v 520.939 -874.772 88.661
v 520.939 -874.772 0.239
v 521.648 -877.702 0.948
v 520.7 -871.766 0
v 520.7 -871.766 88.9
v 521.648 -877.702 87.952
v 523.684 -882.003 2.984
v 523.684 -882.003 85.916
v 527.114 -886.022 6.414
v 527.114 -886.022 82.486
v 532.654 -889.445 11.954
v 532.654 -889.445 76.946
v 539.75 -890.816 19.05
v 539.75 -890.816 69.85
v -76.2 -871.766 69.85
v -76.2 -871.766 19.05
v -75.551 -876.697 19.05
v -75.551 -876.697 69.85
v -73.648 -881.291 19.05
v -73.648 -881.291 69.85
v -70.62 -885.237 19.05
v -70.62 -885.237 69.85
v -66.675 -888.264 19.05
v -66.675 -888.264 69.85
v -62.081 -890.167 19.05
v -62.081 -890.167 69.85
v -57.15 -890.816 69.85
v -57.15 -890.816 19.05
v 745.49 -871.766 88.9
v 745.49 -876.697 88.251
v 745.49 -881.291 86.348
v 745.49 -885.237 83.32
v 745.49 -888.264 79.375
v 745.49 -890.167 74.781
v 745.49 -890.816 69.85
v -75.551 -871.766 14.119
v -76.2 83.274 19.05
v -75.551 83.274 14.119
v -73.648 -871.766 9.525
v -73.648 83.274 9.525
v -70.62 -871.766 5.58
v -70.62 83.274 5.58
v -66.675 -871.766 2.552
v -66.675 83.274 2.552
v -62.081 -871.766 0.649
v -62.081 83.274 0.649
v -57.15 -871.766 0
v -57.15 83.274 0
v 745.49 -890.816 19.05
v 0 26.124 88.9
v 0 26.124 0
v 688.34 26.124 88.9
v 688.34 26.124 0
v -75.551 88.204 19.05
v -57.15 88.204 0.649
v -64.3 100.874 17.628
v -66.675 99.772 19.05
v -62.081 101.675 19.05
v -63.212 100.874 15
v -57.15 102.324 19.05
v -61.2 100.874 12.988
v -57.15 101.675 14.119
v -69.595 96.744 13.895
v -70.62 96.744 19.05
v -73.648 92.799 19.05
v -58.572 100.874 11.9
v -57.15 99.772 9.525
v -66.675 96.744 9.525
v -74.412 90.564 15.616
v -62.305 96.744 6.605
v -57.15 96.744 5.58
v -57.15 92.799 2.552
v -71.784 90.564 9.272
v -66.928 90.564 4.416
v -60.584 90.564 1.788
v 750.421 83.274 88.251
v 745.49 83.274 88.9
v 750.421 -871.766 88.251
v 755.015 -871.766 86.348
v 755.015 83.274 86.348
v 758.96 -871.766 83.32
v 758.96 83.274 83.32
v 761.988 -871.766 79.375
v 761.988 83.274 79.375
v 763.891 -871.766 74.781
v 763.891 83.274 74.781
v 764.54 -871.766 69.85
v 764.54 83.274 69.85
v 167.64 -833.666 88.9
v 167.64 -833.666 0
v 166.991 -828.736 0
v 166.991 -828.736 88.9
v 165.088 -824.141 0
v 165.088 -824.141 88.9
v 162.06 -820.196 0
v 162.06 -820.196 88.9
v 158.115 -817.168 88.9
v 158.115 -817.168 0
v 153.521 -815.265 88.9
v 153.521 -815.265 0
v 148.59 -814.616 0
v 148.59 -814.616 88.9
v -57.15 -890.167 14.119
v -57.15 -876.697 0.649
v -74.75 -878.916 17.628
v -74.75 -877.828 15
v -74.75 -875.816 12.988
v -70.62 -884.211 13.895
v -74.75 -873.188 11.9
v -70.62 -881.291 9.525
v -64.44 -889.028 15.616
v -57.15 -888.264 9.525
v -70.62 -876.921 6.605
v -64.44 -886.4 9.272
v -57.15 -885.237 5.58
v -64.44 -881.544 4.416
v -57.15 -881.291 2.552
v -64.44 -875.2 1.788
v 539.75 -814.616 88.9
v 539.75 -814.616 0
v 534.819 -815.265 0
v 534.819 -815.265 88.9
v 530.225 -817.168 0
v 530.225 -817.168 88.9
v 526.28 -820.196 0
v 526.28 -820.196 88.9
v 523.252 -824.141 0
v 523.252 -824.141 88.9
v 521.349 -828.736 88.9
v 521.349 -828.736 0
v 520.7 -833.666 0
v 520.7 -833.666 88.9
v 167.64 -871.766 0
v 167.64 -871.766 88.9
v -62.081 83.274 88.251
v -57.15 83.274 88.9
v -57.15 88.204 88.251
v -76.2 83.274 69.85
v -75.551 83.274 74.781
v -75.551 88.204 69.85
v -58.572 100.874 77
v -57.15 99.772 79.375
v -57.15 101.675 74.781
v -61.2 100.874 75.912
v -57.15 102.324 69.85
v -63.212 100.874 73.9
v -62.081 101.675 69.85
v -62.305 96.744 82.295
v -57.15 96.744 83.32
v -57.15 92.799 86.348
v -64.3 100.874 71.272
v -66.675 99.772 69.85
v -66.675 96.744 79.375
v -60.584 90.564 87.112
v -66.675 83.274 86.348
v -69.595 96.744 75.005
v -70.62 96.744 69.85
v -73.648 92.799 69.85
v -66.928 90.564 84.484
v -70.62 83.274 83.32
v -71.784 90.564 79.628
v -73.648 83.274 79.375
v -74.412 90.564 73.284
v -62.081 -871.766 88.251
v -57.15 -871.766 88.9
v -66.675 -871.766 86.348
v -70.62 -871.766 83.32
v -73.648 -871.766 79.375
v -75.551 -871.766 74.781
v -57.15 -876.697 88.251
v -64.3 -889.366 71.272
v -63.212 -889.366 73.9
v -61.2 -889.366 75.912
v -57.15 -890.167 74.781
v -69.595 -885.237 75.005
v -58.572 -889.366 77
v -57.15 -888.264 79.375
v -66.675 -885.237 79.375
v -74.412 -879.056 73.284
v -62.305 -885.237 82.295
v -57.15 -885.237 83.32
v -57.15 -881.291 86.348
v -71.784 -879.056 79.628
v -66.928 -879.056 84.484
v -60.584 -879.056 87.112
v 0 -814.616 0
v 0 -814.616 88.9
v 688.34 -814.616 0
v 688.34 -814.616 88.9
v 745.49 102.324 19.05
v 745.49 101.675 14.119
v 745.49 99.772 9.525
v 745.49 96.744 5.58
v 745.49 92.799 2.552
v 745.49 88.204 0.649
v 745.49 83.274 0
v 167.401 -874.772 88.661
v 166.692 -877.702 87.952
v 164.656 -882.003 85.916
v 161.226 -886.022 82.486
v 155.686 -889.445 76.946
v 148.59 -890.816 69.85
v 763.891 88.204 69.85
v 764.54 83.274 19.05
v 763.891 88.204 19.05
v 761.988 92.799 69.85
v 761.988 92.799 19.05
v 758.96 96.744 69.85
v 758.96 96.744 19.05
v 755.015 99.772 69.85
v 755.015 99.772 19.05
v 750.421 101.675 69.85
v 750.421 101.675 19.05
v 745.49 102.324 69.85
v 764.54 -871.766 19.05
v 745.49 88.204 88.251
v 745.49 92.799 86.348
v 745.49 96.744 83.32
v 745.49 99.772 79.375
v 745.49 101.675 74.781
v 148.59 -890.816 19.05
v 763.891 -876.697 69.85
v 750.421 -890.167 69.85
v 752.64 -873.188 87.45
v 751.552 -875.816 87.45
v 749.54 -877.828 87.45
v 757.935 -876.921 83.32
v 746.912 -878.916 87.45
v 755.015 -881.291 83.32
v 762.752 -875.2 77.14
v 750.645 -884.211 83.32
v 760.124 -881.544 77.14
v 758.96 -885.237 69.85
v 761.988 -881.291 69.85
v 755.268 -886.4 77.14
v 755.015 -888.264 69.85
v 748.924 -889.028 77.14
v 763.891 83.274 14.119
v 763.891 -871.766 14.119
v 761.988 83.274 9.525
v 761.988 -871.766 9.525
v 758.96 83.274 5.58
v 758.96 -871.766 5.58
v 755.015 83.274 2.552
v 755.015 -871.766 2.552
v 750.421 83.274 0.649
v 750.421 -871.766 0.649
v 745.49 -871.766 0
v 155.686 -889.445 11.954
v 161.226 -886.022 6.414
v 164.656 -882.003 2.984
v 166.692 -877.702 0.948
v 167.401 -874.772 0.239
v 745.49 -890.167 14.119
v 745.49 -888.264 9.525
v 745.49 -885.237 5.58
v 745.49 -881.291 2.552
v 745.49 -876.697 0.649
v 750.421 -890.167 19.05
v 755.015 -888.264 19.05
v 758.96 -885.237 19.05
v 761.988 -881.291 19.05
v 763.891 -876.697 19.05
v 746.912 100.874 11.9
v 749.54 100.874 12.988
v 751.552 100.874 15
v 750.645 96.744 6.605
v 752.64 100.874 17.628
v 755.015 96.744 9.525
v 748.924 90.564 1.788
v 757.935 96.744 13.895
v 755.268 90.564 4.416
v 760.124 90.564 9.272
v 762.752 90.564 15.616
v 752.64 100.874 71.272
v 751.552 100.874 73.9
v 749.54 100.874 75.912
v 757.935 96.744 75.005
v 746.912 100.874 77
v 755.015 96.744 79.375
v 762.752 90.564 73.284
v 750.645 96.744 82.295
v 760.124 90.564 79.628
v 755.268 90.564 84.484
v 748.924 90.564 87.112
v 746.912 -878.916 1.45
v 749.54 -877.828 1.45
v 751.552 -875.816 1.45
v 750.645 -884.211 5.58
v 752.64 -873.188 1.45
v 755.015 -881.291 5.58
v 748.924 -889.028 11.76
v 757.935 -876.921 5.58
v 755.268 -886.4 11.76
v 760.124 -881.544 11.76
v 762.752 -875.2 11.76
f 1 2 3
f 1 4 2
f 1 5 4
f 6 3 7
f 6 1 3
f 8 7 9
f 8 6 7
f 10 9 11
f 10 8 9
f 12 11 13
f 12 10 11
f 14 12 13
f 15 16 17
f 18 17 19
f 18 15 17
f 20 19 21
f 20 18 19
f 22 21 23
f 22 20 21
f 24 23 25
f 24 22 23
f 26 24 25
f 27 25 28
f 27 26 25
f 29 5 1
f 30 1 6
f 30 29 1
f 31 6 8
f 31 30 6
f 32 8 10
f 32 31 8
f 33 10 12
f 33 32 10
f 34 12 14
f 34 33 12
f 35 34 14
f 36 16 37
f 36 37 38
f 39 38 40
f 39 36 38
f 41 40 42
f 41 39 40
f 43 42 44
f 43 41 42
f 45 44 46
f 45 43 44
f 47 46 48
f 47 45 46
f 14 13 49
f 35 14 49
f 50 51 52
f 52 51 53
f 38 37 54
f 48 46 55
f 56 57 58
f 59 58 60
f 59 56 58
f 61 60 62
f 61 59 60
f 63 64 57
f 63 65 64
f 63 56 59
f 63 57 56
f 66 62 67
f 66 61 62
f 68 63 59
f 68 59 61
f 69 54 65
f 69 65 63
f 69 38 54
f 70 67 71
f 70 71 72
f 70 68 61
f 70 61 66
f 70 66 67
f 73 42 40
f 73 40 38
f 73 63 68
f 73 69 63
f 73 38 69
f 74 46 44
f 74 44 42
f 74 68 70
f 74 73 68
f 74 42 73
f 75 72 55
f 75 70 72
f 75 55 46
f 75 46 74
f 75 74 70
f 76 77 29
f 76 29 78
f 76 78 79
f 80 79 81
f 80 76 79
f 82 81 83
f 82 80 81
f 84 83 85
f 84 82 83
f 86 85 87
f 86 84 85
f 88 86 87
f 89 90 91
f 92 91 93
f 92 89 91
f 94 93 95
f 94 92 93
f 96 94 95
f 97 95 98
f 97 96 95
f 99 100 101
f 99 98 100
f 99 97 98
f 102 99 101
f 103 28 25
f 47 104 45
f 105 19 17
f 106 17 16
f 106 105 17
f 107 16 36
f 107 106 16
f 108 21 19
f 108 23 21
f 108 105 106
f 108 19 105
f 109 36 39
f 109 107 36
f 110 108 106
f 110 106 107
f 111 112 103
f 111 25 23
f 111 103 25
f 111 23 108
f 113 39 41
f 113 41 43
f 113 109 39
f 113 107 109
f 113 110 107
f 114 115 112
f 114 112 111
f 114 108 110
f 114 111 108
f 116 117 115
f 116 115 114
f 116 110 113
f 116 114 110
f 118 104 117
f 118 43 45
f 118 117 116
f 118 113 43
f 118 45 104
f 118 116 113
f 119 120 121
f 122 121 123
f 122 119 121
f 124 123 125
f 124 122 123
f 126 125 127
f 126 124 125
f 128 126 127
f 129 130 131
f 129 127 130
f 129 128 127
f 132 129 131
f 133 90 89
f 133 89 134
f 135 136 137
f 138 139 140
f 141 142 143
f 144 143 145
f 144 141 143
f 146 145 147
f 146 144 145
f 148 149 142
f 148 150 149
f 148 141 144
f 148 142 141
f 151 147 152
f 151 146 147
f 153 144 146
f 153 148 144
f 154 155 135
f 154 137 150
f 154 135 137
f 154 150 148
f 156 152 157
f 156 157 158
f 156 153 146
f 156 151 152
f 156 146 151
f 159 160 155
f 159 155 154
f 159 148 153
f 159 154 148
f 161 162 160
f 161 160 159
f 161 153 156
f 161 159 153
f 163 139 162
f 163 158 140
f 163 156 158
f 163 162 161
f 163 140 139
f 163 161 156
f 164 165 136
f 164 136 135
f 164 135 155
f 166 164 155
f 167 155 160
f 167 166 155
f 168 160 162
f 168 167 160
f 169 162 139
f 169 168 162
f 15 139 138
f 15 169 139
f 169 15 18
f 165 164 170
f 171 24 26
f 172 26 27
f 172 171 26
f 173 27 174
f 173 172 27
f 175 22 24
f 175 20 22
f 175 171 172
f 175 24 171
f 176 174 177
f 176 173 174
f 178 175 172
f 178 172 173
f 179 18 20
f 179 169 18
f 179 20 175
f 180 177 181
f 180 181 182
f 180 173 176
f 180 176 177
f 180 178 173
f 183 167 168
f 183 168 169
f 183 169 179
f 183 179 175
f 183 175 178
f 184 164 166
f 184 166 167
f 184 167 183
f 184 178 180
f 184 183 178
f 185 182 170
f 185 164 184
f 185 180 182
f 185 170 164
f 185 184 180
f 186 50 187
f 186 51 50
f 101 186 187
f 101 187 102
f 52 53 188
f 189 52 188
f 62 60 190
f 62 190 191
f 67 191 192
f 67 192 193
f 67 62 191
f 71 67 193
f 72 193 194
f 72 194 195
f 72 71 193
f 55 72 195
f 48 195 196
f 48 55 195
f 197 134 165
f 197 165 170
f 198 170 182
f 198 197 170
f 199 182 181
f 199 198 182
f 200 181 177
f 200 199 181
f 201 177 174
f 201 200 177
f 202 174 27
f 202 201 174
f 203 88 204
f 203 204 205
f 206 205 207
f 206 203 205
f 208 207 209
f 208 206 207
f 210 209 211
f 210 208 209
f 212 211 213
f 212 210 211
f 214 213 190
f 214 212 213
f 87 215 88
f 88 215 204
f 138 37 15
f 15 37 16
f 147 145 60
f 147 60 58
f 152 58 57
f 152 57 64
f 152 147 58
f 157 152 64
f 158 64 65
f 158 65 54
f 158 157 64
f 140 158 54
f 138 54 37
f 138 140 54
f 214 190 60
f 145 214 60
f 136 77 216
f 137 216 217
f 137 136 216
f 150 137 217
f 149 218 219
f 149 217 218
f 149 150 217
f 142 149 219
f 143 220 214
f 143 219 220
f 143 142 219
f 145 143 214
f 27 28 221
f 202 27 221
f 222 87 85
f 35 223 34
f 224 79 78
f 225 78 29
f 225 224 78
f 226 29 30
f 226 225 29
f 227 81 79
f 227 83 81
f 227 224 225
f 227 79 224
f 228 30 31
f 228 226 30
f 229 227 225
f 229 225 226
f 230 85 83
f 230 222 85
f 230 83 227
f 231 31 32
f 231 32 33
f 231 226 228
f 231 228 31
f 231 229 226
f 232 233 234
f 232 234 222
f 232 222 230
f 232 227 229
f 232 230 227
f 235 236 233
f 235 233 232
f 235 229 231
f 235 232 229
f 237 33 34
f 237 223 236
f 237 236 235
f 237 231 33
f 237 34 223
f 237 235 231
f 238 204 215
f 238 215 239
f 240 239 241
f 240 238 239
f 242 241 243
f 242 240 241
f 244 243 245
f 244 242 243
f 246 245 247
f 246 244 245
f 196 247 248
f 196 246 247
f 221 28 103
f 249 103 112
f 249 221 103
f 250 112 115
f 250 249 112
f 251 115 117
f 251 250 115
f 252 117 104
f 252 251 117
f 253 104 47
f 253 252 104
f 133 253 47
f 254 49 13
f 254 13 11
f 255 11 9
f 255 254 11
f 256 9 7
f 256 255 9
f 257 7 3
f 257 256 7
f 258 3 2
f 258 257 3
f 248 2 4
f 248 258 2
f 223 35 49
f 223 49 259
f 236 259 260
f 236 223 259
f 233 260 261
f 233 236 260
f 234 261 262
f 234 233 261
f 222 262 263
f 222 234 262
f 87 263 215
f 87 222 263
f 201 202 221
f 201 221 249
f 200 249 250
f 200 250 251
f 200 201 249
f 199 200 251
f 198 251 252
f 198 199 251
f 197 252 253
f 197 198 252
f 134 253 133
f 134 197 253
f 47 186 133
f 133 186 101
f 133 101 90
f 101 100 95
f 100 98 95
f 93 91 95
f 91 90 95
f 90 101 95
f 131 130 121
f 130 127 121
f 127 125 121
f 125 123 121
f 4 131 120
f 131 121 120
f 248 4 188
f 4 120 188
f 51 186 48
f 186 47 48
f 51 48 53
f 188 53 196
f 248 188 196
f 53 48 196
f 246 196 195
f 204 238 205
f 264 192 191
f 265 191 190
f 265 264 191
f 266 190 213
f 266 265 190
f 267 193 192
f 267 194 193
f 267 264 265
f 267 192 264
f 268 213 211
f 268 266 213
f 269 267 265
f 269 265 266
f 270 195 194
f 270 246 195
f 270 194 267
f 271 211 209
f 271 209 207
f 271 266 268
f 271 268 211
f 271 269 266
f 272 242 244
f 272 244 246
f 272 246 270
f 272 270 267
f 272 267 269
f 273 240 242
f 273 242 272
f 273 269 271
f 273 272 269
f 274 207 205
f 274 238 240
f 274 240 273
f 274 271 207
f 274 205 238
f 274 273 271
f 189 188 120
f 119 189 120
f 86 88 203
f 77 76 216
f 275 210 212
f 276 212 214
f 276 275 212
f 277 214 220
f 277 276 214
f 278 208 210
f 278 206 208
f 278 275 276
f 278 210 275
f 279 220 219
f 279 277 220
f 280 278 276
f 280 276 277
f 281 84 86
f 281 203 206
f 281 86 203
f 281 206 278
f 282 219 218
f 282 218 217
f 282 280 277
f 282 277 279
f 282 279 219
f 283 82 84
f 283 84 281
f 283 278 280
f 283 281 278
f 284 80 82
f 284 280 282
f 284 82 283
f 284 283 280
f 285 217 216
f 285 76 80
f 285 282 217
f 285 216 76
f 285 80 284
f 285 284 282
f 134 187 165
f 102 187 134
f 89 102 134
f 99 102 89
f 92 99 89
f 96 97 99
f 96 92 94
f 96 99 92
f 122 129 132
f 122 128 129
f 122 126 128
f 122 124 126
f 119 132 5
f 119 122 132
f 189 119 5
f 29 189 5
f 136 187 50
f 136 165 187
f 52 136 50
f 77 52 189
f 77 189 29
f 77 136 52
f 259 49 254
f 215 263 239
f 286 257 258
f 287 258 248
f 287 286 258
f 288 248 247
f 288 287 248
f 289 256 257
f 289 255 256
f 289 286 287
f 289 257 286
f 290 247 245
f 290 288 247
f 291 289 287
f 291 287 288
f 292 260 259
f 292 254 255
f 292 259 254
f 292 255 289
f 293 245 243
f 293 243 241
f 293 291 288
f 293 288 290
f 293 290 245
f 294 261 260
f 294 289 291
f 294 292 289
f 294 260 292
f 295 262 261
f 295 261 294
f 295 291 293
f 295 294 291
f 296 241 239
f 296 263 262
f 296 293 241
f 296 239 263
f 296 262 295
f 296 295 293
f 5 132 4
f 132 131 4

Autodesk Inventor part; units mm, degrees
ref_plane "YZ Plane" through (0, 0, 0) normal (1, 0, 0) x (0, 1, 0)
ref_plane "XZ Plane" through (0, 0, 0) normal (0, 1, 0) x (-1, 0, 0)
ref_plane "XY Plane" through (0, 0, 0) normal (0, 0, 1) x (1, 0, 0)
sketch "Sketch1" plane through (0, 0, 0) normal (0, 0, 1) x (1, 0, 0)
  line L0 (0, 26.1238) -> (688.34, 26.1238)
  line L1 (688.34, 26.1238) -> (688.34, -814.6162)
  line L2 (0, 26.1238) -> (0, -814.6162)
  line L3 (0, -814.6162) -> (167.64, -814.6162)
  line L4 (688.34, -814.6162) -> (520.7, -814.6162)
  line L5 (520.7, -890.8162) -> (764.54, -890.8162)
  line L6 (764.54, -890.8162) -> (764.54, 102.3238)
  line L7 (764.54, 102.3238) -> (-76.2, 102.3238)
  line L8 (-76.2, 102.3238) -> (-76.2, -890.8162)
  line L9 (-76.2, -890.8162) -> (167.64, -890.8162)
  line L10 (167.64, -814.6162) -> (167.64, -890.8162)
  line L11 (520.7, -814.6162) -> (520.7, -890.8162)
  point P0 (0, 0)
  dimension "d0" = 688.34
  dimension "d1" = 840.74
  dimension "d2" = 167.64
  dimension "d3" = 167.64
  dimension "d4" = 76.2
extrude "Extrusion1" add sketch "Sketch1" along normal blind 88.9
fillet "Fillet1" radius 19.05 18 edges at (-76.2, -394.2462, 88.9) (45.72, -890.8162, 88.9) (45.72, -890.8162, 0) (-76.2, -394.2462, 0) (-76.2, -890.8162, 44.45) (167.64, -890.8162, 44.45) (520.7, -890.8162, 44.45) (764.54, -890.8162, 44.45) (642.62, -890.8162, 88.9) (642.62, -890.8162, 0) (764.54, -394.2462, 88.9) (764.54, -394.2462, 0) (764.54, 102.3238, 44.45) (344.17, 102.3238, 88.9) (344.17, 102.3238, 0) (-76.2, 102.3238, 44.45) (520.7, -814.6162, 44.45) (167.64, -814.6162, 44.45)
sketch "Sketch2" plane through (764.54, -871.7662, 19.05) normal (1, 0, 0) x (0, 0, -1)
  line L0 (-65.2441, 154.6268) -> (-65.2441, 182.3935) construction
  line L1 (-65.2441, 182.3935) -> (47.3065, 182.3935) construction
  line L2 (47.3065, 182.3935) -> (47.3065, 154.6268) construction
  line L3 (47.3065, 154.6268) -> (-65.2441, 154.6268) construction
  line L4 (-58.9935, 771.5963) -> (-58.9935, 799.363) construction
  line L5 (-58.9935, 799.363) -> (53.557, 799.363) construction
  line L6 (53.557, 799.363) -> (53.557, 771.5963) construction
  line L7 (53.557, 771.5963) -> (-58.9935, 771.5963) construction
  point P0 (19.05, 871.7662)
  dimension "d3" = 167.64
sketch "Sketch3" plane through (-76.2, -871.7662, 19.05) normal (-1, 0, 0) x (0, 0, 1)
  line L0 (66.8415, 917.1452) -> (66.8415, 824.847) construction
  line L1 (66.8415, 824.847) -> (-3.0085, 824.847) construction
  line L2 (-3.0085, 824.847) -> (-3.0085, 917.1452) construction
  line L3 (-3.0085, 917.1452) -> (66.8415, 917.1452) construction
  line L4 (68.429, 179.765) -> (68.429, 87.4668) construction
  line L5 (68.429, 87.4668) -> (-1.421, 87.4668) construction
  line L6 (-1.421, 87.4668) -> (-1.421, 179.765) construction
  line L7 (-1.421, 179.765) -> (68.429, 179.765) construction
  point P0 (-19.05, 871.7662)
  dimension "d3" = 167.64
properties part number "Bumpers" material "Fabric"
